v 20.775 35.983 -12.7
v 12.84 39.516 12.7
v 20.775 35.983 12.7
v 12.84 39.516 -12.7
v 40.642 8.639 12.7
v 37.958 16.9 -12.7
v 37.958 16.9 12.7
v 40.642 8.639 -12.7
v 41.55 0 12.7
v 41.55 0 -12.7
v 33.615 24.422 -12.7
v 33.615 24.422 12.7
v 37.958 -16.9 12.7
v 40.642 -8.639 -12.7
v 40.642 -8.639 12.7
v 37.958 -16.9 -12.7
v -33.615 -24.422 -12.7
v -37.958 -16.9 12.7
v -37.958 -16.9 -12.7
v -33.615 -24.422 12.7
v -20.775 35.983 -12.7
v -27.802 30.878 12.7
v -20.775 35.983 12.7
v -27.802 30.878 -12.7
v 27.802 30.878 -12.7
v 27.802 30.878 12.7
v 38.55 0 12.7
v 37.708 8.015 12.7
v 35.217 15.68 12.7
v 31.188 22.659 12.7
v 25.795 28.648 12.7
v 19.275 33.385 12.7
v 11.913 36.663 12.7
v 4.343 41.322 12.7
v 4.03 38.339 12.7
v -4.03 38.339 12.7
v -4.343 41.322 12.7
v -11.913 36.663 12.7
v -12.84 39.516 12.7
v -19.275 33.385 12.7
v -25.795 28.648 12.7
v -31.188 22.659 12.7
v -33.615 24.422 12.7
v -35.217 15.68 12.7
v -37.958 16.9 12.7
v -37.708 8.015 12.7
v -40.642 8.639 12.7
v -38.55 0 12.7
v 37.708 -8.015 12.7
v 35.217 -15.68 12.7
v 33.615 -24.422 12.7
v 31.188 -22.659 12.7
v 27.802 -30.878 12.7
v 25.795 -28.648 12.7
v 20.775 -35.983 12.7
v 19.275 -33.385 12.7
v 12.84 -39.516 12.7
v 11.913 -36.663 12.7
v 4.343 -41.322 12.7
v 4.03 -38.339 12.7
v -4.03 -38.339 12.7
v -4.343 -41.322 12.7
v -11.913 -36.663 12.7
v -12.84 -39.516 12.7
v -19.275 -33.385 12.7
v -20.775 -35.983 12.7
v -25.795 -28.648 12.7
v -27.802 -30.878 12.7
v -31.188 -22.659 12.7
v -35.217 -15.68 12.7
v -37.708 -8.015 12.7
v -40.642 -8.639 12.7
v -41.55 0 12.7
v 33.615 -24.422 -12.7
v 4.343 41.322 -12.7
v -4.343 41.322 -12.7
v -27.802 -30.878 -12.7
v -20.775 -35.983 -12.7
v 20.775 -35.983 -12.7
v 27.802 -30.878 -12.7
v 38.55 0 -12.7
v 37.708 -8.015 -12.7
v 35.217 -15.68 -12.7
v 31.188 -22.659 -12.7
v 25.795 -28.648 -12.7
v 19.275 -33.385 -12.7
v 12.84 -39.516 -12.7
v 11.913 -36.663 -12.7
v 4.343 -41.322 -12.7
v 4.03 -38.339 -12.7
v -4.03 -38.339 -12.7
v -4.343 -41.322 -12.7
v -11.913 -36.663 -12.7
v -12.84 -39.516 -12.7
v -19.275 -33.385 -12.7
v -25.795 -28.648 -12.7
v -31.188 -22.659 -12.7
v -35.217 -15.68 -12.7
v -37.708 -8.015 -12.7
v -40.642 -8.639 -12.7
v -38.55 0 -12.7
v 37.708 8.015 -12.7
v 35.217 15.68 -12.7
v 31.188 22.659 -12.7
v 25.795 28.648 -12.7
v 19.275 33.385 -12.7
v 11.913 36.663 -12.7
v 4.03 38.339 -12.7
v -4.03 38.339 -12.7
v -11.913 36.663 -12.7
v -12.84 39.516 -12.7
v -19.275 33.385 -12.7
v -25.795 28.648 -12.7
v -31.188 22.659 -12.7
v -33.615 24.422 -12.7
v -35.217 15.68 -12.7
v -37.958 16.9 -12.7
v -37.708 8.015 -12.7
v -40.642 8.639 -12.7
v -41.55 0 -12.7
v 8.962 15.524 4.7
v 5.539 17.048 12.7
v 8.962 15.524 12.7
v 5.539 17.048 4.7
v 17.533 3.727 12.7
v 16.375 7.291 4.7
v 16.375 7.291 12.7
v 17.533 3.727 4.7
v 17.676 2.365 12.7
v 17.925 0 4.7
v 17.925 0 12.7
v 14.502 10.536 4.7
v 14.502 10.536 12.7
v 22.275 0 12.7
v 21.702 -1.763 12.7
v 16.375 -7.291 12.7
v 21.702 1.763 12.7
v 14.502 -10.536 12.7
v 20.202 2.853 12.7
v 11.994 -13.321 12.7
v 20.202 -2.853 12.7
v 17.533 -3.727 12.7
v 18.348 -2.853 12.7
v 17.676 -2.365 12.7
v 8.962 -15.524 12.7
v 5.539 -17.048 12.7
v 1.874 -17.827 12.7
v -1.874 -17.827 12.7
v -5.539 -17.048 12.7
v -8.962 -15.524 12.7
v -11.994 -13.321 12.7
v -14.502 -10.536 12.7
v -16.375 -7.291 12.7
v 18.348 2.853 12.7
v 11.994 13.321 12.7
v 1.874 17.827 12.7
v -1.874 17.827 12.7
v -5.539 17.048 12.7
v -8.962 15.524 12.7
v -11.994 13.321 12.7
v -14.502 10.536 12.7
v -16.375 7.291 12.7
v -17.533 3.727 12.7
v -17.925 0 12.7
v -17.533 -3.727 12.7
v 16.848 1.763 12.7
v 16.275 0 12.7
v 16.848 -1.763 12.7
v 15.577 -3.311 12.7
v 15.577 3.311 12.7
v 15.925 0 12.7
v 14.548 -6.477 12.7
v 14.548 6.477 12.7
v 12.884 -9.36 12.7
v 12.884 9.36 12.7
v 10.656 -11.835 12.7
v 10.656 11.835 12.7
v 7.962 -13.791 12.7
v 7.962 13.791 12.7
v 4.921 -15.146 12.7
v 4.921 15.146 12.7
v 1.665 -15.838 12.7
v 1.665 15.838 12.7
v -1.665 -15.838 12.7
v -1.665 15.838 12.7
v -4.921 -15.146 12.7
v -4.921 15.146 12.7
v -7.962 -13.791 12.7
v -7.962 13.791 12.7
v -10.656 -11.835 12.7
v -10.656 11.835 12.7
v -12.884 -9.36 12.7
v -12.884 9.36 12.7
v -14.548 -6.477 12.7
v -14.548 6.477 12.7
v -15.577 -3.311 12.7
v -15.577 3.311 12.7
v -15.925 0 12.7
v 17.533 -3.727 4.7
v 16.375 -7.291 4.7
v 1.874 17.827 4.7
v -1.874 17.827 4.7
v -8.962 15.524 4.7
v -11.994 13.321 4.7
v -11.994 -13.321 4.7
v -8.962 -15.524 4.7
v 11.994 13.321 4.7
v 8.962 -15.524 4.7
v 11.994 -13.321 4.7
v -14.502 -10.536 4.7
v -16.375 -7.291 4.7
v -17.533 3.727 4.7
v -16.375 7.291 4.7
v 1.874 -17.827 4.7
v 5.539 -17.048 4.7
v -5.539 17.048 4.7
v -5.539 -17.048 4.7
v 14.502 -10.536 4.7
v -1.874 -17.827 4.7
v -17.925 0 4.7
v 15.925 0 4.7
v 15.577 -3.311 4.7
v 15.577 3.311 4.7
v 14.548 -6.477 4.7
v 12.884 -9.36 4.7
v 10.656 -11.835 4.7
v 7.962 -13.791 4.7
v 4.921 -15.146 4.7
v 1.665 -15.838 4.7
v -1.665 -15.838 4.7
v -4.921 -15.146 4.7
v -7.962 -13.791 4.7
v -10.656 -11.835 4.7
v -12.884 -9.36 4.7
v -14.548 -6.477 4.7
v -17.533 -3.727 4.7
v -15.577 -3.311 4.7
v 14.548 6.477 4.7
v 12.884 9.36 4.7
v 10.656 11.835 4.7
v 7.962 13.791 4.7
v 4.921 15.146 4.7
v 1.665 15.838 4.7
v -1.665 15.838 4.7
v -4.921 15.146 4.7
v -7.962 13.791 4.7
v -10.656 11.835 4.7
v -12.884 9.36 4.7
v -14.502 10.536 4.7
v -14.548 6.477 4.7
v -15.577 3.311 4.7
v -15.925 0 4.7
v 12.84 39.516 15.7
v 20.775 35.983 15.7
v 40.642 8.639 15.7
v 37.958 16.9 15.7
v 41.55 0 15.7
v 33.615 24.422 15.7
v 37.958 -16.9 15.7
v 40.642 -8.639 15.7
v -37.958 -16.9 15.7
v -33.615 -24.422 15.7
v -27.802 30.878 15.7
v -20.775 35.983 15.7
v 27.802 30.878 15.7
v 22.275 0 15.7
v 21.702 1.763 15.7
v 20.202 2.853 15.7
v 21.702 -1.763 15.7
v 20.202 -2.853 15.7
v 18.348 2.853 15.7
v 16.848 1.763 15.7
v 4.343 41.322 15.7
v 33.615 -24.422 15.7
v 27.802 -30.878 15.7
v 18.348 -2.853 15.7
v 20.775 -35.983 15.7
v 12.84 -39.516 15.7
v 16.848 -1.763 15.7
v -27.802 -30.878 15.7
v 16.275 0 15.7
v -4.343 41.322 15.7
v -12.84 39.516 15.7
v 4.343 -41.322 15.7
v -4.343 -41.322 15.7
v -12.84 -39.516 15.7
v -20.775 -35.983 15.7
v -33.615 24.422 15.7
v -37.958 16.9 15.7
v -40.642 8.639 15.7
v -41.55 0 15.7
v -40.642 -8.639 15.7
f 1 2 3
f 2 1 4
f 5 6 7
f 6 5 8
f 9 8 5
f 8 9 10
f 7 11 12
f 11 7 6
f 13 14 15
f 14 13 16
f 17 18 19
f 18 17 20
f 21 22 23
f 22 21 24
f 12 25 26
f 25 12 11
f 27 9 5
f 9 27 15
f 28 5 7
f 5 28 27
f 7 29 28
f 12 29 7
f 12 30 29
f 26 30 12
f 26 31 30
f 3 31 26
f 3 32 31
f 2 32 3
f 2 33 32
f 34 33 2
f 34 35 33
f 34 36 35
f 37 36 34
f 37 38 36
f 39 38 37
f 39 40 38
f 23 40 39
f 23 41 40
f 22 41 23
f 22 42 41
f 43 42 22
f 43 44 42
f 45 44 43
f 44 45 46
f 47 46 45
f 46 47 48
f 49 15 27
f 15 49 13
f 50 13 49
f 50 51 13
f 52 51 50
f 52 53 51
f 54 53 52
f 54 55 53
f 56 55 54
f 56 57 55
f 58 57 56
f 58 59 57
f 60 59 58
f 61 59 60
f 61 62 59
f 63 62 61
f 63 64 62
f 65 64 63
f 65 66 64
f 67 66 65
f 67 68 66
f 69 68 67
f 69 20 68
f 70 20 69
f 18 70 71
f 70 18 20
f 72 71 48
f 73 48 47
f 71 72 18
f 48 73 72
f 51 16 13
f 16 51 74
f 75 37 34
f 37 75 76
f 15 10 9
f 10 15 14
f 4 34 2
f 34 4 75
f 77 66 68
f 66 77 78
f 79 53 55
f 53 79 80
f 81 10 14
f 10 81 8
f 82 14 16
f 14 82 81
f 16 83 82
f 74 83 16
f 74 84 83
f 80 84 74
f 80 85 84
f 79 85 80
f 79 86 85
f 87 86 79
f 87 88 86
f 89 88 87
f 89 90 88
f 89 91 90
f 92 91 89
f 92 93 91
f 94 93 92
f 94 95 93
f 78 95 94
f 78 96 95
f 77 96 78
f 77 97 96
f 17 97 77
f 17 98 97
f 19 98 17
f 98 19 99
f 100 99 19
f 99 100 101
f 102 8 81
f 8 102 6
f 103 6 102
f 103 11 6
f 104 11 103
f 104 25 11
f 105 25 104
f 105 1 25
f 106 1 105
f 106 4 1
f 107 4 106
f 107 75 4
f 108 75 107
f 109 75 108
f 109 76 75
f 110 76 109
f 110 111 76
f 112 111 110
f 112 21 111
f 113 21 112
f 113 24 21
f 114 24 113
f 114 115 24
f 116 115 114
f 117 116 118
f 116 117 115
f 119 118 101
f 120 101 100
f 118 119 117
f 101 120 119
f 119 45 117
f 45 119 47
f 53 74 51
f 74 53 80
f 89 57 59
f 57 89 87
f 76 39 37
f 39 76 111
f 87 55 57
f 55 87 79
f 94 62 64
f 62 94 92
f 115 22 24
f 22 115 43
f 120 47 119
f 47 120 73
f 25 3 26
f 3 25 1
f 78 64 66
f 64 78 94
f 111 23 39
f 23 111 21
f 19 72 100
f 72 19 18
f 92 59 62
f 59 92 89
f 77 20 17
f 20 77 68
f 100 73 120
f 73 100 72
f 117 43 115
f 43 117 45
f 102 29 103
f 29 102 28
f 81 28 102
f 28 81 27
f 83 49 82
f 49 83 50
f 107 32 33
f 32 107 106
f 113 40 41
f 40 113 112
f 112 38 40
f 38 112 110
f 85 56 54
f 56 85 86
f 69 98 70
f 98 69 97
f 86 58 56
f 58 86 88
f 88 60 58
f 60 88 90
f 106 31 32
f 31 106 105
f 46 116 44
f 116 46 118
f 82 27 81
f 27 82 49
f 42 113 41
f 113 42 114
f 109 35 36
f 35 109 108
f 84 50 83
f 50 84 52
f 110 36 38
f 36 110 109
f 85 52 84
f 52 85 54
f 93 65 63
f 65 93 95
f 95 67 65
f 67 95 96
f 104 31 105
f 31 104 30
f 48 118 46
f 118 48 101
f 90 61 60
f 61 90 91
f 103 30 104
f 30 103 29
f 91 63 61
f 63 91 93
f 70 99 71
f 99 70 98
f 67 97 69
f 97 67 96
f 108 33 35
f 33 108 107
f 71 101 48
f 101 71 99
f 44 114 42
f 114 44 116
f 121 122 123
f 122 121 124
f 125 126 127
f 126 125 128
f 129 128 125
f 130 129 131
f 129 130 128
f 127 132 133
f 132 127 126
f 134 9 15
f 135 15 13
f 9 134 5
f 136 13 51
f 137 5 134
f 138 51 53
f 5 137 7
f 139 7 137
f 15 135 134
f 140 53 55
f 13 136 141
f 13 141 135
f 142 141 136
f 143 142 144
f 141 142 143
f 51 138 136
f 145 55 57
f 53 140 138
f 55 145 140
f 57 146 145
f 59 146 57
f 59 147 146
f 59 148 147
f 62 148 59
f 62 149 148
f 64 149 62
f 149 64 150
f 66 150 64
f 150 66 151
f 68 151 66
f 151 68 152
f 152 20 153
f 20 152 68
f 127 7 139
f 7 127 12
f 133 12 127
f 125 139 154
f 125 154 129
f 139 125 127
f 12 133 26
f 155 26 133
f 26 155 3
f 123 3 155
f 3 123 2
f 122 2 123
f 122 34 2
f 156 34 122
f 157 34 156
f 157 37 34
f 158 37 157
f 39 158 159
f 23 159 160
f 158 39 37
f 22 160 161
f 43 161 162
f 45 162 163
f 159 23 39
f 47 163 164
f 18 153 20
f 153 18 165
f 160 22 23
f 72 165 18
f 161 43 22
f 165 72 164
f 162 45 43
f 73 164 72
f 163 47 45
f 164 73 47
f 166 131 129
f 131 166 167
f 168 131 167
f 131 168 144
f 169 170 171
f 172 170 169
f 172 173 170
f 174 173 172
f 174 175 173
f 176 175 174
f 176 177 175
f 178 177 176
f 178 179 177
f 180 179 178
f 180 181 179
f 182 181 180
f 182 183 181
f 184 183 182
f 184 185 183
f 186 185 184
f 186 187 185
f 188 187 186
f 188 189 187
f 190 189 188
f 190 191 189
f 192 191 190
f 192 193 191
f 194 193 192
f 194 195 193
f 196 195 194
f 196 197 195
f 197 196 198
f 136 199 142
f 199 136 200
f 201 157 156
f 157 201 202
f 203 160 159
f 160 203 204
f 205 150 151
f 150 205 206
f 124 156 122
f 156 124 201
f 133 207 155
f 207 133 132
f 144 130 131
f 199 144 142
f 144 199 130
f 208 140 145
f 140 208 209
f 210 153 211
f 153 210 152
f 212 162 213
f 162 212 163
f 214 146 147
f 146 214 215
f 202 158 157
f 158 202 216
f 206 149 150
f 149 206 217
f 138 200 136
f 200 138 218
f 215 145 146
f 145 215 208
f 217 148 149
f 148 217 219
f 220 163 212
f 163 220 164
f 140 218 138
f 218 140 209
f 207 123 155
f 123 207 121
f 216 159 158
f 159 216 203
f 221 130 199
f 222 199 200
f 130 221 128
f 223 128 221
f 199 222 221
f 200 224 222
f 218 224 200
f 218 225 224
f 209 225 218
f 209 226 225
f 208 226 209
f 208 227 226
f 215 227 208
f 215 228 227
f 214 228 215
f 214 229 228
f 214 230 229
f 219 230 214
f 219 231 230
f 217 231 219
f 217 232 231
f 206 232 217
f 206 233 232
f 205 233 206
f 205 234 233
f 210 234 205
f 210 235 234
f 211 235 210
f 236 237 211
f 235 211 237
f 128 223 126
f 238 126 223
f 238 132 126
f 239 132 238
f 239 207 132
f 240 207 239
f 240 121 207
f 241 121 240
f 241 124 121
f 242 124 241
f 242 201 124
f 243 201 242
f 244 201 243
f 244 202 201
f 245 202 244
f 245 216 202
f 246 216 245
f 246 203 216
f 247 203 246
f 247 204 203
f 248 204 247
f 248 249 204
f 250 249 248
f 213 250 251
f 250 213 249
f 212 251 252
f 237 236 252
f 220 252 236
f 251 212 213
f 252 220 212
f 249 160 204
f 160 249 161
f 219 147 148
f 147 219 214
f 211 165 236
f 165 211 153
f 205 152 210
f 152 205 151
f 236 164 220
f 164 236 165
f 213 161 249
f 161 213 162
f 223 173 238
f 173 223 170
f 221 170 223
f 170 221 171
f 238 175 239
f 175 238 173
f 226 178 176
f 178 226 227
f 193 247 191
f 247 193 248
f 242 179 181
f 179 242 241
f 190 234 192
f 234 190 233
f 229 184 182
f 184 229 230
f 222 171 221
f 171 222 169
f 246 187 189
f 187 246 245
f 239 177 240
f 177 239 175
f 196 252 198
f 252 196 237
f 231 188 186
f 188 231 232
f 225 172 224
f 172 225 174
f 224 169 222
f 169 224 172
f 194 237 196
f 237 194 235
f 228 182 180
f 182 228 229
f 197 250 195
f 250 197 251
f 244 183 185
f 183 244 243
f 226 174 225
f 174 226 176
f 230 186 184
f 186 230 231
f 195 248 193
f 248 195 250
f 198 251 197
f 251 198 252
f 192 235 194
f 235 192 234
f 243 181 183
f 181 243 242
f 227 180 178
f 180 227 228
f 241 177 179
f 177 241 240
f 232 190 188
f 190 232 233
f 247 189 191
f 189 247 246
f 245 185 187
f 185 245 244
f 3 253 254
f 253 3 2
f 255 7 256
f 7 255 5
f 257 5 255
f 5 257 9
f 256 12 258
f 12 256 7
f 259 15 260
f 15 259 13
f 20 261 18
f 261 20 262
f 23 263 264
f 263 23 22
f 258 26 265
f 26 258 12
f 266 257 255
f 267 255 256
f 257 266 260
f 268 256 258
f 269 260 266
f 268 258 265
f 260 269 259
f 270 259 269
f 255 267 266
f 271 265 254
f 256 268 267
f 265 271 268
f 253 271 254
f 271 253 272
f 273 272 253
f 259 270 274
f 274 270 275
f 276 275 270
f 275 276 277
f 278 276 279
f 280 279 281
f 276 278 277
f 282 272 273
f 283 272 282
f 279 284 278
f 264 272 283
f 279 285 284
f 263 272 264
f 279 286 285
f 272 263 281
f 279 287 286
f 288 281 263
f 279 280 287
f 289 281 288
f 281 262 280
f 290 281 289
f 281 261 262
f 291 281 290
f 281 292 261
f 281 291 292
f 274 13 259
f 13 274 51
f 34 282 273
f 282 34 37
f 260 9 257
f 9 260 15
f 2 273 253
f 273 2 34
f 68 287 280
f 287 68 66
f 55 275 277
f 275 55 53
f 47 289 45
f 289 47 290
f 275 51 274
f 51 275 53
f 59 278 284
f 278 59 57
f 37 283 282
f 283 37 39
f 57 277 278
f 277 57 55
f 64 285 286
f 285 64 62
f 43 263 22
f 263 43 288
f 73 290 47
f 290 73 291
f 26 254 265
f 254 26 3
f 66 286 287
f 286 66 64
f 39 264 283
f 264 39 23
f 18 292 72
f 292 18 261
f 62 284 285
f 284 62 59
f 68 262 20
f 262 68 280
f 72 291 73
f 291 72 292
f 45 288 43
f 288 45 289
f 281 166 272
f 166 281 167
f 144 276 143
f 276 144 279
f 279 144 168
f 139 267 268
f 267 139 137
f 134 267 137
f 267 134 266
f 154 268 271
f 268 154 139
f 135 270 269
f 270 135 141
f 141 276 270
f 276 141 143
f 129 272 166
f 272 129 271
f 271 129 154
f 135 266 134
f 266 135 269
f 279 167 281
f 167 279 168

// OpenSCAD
wall_o = 3;
wall_i = 2;
spk_od = 77.1;
spk_id = 31.85;
depth = 25.4;

//Outter Hull
difference(){
	cylinder(h=depth,r=(spk_od/2)+(wall_o),center=true);
	cylinder(h=depth,r=spk_od/2,center=true);
}

//Support 
translate([0,0,(depth-8)/2])
	difference(){
		cylinder(h=8,r=(spk_id/2)+(wall_i),center=true);
		cylinder(h=8,r=spk_id/2,center=true);
	}

//Cap
translate([0,0,(depth+wall_o)/2])
	difference(){
		cylinder(h=wall_o, r=(spk_od/2)+(wall_o), center=true);
		translate([spk_od/4,0,0])
			cylinder(h=wall_o, r=3, center=true);
	}
